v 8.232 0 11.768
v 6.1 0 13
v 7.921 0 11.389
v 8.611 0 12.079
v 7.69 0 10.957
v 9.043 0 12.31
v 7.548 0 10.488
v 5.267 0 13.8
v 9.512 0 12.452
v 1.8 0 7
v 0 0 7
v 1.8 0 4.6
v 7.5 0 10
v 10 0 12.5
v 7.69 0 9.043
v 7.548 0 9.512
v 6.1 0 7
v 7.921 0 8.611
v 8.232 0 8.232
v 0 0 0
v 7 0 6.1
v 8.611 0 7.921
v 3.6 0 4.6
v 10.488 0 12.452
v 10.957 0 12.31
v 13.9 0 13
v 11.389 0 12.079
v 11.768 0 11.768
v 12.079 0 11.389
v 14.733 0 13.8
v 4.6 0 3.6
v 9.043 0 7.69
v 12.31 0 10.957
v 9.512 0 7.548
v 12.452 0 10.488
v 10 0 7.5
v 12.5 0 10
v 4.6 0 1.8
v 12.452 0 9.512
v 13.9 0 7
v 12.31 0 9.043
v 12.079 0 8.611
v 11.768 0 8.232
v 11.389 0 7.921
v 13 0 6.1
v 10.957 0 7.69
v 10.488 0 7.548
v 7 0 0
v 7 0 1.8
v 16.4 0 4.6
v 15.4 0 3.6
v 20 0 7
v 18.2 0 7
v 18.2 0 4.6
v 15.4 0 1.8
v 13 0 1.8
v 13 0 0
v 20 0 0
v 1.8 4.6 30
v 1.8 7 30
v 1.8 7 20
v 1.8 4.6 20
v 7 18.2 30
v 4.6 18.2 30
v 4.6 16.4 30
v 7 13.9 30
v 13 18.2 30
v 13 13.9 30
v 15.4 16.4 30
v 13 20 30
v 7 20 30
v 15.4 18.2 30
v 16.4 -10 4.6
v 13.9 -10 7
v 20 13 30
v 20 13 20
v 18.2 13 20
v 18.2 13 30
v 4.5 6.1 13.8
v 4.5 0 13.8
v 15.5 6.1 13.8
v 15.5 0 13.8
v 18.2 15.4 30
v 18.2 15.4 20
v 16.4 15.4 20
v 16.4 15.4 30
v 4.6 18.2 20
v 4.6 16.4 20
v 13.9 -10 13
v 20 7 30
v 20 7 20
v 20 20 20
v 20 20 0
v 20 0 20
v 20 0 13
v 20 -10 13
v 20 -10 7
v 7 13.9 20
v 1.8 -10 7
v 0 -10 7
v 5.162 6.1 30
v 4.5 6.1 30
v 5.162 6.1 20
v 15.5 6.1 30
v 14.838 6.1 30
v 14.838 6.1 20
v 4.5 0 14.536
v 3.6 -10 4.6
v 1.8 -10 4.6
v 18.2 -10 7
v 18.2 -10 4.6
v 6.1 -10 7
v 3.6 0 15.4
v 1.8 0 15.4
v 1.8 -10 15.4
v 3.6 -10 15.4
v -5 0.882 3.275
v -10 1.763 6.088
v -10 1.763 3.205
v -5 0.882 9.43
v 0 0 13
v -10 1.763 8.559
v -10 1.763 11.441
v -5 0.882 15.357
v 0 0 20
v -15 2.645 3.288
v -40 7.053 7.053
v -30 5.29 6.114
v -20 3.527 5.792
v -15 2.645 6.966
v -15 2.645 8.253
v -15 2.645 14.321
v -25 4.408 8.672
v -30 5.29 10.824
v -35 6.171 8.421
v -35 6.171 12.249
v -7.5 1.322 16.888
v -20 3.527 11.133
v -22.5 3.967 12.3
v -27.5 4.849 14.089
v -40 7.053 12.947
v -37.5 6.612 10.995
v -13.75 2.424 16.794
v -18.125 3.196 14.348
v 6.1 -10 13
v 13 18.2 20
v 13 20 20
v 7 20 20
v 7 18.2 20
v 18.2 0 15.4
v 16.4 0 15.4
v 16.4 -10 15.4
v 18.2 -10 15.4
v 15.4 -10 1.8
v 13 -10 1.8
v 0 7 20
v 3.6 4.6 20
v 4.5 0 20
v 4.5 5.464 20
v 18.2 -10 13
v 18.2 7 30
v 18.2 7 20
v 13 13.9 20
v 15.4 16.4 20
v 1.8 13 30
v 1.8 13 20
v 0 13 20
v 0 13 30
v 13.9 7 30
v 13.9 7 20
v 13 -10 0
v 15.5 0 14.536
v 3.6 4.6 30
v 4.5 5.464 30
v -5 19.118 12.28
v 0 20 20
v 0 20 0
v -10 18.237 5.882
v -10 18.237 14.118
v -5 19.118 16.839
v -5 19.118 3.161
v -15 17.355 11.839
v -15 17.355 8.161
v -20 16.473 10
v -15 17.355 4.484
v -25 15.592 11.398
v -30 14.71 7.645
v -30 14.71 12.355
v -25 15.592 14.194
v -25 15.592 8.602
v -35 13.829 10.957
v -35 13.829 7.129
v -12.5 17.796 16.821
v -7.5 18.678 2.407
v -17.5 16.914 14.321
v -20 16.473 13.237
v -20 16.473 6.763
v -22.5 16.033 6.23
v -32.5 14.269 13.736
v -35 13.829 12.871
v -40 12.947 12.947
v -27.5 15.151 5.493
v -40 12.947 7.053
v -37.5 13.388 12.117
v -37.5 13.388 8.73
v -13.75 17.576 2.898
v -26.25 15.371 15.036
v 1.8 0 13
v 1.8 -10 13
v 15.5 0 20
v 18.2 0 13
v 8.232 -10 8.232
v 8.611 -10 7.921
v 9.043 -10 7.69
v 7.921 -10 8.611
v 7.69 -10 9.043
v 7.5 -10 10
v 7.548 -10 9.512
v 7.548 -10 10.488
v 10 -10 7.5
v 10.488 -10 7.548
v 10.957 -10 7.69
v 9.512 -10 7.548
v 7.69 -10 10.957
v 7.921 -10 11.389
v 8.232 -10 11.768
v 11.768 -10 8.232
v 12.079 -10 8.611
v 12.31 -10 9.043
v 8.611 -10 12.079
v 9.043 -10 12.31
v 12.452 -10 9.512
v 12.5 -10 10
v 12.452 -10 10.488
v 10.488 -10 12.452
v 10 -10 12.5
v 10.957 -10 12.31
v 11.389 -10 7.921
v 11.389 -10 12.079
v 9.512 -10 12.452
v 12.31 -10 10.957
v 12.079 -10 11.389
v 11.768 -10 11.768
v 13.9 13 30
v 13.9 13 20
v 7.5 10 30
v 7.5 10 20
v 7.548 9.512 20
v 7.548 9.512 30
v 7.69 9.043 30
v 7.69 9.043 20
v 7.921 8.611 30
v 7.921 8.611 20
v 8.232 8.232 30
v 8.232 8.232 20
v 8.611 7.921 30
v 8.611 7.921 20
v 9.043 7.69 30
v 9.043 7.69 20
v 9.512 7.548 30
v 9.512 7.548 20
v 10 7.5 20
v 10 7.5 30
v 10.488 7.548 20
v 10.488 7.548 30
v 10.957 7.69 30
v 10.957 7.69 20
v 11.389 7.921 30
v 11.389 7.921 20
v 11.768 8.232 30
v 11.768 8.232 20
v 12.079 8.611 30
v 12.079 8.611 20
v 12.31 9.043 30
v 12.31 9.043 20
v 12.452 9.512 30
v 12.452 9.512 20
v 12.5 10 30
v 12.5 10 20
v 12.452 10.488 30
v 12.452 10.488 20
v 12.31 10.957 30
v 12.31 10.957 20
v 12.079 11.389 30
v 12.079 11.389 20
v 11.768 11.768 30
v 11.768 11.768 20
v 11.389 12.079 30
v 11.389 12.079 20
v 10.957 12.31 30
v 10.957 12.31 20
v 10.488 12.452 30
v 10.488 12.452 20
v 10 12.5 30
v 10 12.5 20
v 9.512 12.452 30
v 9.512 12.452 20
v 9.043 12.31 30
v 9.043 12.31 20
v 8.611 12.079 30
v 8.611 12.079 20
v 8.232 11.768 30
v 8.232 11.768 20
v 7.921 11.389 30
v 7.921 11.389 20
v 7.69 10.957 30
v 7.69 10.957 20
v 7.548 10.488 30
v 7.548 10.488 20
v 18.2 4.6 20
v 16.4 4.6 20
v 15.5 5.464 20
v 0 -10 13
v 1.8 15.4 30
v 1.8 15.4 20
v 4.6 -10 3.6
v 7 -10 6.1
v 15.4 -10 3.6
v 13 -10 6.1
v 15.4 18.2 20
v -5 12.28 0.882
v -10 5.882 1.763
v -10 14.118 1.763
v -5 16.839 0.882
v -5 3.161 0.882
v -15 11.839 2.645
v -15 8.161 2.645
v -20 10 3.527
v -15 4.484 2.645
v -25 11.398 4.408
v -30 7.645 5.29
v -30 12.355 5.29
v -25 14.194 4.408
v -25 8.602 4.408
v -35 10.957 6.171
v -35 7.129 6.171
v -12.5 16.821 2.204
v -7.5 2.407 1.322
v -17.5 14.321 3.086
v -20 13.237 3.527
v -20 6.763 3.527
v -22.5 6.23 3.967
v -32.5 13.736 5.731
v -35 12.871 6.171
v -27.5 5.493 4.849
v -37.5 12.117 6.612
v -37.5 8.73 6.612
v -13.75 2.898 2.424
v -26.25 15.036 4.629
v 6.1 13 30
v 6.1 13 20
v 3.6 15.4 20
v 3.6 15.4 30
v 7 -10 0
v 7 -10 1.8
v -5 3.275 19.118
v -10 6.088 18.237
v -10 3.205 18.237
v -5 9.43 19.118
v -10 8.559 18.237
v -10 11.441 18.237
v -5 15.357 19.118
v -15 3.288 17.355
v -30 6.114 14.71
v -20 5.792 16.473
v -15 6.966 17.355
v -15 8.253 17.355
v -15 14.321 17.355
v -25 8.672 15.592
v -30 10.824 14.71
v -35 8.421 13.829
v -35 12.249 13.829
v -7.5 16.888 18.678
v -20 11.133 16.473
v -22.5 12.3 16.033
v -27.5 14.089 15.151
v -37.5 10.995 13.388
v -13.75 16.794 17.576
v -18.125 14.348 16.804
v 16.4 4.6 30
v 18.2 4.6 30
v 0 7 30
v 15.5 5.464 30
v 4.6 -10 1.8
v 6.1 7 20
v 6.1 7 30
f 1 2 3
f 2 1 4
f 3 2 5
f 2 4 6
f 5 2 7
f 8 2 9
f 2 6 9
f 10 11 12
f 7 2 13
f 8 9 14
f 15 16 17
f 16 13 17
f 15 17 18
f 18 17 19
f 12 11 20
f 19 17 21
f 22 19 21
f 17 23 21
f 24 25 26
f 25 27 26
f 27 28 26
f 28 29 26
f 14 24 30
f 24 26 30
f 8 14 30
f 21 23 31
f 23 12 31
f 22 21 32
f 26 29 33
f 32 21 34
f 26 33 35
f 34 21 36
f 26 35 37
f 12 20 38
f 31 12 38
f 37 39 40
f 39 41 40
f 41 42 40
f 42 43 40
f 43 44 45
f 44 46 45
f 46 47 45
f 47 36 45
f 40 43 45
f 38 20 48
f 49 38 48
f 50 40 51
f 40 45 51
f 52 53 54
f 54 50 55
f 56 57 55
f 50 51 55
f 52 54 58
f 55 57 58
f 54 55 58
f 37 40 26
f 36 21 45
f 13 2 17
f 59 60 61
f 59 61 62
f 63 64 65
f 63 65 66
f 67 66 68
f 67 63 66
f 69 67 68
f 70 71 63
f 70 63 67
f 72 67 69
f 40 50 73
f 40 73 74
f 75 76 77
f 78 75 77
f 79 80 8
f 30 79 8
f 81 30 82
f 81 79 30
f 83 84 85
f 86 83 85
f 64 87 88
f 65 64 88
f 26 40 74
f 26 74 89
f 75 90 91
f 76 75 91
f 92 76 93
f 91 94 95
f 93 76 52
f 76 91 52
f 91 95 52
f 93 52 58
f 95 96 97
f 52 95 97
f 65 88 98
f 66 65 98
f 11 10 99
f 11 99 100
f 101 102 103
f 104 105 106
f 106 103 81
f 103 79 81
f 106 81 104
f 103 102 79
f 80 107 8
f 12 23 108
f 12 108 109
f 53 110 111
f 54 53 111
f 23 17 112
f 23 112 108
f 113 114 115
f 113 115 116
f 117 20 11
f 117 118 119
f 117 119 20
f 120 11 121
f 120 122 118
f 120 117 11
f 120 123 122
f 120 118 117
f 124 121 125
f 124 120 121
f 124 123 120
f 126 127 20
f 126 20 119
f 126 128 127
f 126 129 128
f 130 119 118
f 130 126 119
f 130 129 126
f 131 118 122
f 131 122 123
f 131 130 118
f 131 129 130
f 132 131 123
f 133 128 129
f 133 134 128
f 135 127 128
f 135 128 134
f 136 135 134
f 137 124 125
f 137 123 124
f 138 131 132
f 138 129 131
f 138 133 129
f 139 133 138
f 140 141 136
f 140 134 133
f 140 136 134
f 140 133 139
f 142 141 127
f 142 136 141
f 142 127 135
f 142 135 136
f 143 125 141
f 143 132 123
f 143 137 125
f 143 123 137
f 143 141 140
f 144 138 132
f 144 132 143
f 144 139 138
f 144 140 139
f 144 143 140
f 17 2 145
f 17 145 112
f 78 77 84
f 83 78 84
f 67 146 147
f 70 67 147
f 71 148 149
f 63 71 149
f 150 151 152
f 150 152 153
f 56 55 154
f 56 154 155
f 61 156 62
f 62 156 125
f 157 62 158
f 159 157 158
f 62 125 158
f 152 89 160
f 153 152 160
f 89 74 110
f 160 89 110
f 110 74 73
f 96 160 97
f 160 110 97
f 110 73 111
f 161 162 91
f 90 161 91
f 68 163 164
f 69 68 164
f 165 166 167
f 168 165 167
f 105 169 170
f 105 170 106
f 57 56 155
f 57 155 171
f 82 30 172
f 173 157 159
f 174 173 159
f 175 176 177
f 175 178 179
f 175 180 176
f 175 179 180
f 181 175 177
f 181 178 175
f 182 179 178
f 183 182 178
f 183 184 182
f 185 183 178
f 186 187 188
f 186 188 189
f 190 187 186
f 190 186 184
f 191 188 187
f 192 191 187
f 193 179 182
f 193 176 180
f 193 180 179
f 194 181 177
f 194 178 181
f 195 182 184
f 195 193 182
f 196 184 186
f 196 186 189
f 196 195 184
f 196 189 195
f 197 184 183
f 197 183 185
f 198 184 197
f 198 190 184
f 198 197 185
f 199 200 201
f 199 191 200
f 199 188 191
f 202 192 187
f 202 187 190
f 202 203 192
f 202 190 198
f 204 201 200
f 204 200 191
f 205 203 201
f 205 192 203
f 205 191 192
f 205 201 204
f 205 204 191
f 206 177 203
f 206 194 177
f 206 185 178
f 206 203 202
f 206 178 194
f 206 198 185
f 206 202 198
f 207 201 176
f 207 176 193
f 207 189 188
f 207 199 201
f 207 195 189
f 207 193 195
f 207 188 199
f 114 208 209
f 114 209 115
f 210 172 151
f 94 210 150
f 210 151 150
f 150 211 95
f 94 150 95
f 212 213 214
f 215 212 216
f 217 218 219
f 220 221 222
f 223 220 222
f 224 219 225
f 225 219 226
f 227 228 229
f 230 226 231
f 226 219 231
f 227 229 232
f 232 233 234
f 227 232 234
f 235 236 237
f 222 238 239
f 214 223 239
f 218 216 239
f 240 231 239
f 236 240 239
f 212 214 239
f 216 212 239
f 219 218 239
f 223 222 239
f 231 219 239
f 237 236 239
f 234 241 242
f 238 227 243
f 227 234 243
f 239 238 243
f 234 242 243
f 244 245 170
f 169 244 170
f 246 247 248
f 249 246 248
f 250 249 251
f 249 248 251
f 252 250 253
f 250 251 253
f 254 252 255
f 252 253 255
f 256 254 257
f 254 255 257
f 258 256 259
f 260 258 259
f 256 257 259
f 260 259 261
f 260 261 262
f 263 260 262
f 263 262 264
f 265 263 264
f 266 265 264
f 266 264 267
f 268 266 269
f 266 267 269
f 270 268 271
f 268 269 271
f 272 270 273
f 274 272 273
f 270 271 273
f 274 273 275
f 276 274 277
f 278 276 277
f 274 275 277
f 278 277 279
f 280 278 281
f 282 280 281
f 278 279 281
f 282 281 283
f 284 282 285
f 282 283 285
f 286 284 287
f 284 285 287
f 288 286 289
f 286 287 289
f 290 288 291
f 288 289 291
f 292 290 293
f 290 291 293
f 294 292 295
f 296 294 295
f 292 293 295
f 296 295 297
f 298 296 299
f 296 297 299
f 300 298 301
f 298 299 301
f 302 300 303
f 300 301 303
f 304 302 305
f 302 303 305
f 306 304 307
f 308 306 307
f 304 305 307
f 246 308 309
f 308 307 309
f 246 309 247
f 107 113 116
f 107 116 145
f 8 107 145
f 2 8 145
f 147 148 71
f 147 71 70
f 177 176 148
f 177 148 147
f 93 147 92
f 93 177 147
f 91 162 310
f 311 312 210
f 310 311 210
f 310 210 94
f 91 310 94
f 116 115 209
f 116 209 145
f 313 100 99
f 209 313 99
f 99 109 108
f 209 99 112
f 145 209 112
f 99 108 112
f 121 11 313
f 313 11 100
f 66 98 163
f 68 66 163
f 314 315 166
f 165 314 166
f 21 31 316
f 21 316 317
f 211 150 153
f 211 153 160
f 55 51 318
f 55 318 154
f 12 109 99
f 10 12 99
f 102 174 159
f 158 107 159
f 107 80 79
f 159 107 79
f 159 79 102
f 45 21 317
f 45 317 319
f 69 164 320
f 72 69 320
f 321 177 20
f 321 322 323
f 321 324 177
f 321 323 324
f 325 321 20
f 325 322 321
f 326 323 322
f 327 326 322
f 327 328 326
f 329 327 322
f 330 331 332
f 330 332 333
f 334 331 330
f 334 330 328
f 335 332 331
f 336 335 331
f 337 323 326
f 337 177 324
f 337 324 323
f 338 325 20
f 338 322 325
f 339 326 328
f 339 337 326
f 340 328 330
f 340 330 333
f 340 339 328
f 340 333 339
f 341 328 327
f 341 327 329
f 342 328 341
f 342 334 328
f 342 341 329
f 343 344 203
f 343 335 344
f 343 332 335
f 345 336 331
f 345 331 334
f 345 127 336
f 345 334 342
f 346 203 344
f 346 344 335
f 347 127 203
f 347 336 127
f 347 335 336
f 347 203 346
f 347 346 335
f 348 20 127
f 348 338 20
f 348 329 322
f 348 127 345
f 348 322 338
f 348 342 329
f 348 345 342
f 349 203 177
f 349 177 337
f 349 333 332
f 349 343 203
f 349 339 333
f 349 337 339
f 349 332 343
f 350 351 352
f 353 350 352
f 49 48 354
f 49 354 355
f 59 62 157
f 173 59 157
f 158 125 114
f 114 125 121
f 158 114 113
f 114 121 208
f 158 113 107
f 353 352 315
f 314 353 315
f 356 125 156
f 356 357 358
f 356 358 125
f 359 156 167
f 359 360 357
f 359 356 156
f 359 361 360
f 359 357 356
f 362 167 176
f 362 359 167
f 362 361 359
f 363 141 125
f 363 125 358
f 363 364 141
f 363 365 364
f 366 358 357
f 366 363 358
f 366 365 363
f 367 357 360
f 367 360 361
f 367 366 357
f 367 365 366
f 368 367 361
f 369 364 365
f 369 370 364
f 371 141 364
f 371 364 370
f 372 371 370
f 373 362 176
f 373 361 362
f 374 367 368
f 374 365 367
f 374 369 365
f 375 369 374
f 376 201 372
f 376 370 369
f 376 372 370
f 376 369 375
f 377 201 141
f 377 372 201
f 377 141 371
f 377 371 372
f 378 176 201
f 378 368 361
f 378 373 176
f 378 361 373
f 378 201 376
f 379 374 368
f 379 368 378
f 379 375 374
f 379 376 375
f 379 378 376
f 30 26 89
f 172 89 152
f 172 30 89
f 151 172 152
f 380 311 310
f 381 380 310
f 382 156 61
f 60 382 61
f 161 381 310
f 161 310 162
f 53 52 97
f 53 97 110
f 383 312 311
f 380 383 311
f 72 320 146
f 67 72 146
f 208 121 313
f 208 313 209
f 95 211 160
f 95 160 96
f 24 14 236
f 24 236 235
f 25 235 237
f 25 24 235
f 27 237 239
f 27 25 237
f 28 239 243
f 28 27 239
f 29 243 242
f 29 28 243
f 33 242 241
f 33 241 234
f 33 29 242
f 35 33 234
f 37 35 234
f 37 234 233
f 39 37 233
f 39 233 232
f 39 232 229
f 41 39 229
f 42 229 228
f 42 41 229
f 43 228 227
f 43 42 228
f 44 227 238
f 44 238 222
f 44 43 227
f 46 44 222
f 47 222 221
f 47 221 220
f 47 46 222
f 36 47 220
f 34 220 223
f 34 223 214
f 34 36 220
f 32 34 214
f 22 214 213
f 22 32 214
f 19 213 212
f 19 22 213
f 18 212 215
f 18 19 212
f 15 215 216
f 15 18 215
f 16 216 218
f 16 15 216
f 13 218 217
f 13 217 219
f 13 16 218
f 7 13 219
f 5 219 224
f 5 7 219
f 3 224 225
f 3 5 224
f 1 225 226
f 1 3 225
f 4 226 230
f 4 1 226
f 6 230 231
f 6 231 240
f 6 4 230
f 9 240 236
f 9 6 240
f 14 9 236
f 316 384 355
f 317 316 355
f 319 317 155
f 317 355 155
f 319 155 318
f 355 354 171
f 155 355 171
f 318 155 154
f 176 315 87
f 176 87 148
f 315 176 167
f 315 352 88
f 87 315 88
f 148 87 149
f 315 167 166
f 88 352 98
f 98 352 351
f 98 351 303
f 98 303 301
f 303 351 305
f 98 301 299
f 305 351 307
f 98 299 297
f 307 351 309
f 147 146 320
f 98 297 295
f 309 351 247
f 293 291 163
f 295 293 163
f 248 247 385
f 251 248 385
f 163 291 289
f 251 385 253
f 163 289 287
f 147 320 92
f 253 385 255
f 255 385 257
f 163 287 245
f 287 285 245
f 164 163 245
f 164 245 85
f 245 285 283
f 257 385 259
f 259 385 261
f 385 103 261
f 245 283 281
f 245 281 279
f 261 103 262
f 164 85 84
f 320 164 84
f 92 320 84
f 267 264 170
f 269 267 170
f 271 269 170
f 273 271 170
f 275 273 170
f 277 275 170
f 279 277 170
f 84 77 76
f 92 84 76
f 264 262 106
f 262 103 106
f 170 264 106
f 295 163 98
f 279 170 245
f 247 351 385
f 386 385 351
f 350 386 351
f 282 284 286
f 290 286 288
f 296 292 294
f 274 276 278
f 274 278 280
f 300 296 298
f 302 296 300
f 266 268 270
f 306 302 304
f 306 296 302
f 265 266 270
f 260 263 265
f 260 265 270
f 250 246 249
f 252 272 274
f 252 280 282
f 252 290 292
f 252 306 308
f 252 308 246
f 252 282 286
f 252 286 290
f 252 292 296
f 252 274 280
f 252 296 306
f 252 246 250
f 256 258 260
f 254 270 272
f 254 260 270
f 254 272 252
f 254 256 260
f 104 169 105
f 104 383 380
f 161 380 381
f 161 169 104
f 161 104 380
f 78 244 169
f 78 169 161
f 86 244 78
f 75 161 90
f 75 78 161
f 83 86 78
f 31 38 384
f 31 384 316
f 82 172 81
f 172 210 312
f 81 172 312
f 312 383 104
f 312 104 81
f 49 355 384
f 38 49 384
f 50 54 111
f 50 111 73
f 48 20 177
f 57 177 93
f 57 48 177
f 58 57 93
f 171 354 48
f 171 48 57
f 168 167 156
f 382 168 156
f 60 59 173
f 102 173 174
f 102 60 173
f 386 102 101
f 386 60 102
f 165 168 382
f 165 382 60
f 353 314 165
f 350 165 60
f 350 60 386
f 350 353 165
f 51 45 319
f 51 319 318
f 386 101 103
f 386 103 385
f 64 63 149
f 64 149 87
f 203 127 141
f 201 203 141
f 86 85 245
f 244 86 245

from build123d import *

# Parameters (mm, degrees)
SKETCH1_W           = 20
SKETCH1_H           = 20
BOSS_EXTRUDE1_DEPTH = 20
SKETCH1_4_R         = 2.5
BOSS_EXTRUDE3_DEPTH = 10
SKETCH5_W           = 2.4
SKETCH5_H           = 1.8
CUT_EXTRUDE1_DEPTH  = 6.2
SKETCH8_R           = 2.5
BOSS_EXTRUDE4_DEPTH = 10
SKETCH10_W          = 20
SKETCH10_H          = 20
BOSS_EXTRUDE5_DEPTH = 40
BOSS_EXTRUDE5_TAPER = 10


with BuildPart() as part:
    # Sketch1 → Boss-Extrude1 (new body)
    with BuildSketch(Plane(origin=(0, 0, 0), x_dir=(1, 0, 0), z_dir=(0, 1, 0))):
        with Locations((10, -10)):
            Rectangle(SKETCH1_W, SKETCH1_H)
    extrude(amount=BOSS_EXTRUDE1_DEPTH)

    # Sketch1<4> → Boss-Extrude3 (add)
    with BuildSketch(Plane(origin=(0, 0, 0), x_dir=(1, 0, 0), z_dir=(0, 1, 0))):
        Polygon((13, 0), (7, 0), (7, -1.8), (4.6, -1.8), (4.6, -3.6), (7, -6.1), (13, -6.1), (15.4, -3.6), (15.4, -1.8), (13, -1.8), align=None)
        Polygon((0, -7), (0, -13), (1.8, -13), (1.8, -15.4), (3.6, -15.4), (6.1, -13), (6.1, -7), (3.6, -4.6), (1.8, -4.6), (1.8, -7), align=None)
        Polygon((20, -7), (18.2, -7), (18.2, -4.6), (16.4, -4.6), (13.9, -7), (13.9, -13), (16.4, -15.4), (18.2, -15.4), (18.2, -13), (20, -13), align=None)
        with Locations(Location((10, -10, 0), (0, 0, 270))):
            Circle(SKETCH1_4_R)
    extrude(amount=-BOSS_EXTRUDE3_DEPTH)

    # Sketch5 → Cut-Extrude1 (cut)
    with BuildSketch(Plane.XY.offset(20)):
        with Locations((14.3, 0.9)):
            Rectangle(SKETCH5_W, SKETCH5_H)
        with Locations((5.7, 0.9)):
            Rectangle(SKETCH5_W, SKETCH5_H)
        Polygon((6.9, 6.1), (4.5, 3.6), (4.5, 1.8), (6.9, 1.8), (6.9, 0), (13.1, 0), (13.1, 1.8), (15.5, 1.8), (15.5, 3.6), (13.1, 6.1), align=None)
        Polygon((4.5, 5.364), (4.5, 3.6), (6.9, 6.1), (5.266666667, 6.1), align=None)
        Polygon((14.733333333, 6.1), (13.1, 6.1), (15.5, 3.6), (15.5, 5.364), align=None)
        Polygon((15.5, 6.1), (14.733333333, 6.1), (15.5, 5.364), align=None)
        Polygon((4.5, 6.1), (4.5, 5.364), (5.266666667, 6.1), align=None)
    extrude(amount=-CUT_EXTRUDE1_DEPTH, mode=Mode.SUBTRACT)

    # Sketch8 → Boss-Extrude4 (add)
    with BuildSketch(Plane.XY.offset(20)):
        Polygon((13, 20), (7, 20), (7, 18.2), (4.6, 18.2), (4.6, 16.4), (7, 13.9), (13, 13.9), (15.4, 16.4), (15.4, 18.2), (13, 18.2), align=None)
        Polygon((0, 13), (0, 7), (1.8, 7), (1.8, 4.6), (3.6, 4.6), (4.5, 5.464), (4.5, 6.1), (5.1625, 6.1), (6.1, 7), (6.1, 13), (3.6, 15.4), (1.8, 15.4), (1.8, 13), align=None)
        Polygon((20, 13), (18.2, 13), (18.2, 15.4), (16.4, 15.4), (13.9, 13), (13.9, 7), (14.8375, 6.1), (15.5, 6.1), (15.5, 5.464), (16.4, 4.6), (18.2, 4.6), (18.2, 7), (20, 7), align=None)
        with Locations(Location((10, 10, 0), (0, 0, 180))):
            Circle(SKETCH8_R)
    extrude(amount=BOSS_EXTRUDE4_DEPTH)

    # Sketch10 → Boss-Extrude5 (add)
    with BuildSketch(Plane.ZY):
        with Locations((10, 10)):
            Rectangle(SKETCH10_W, SKETCH10_H)
    extrude(amount=BOSS_EXTRUDE5_DEPTH, taper=BOSS_EXTRUDE5_TAPER)


solid = part.part
